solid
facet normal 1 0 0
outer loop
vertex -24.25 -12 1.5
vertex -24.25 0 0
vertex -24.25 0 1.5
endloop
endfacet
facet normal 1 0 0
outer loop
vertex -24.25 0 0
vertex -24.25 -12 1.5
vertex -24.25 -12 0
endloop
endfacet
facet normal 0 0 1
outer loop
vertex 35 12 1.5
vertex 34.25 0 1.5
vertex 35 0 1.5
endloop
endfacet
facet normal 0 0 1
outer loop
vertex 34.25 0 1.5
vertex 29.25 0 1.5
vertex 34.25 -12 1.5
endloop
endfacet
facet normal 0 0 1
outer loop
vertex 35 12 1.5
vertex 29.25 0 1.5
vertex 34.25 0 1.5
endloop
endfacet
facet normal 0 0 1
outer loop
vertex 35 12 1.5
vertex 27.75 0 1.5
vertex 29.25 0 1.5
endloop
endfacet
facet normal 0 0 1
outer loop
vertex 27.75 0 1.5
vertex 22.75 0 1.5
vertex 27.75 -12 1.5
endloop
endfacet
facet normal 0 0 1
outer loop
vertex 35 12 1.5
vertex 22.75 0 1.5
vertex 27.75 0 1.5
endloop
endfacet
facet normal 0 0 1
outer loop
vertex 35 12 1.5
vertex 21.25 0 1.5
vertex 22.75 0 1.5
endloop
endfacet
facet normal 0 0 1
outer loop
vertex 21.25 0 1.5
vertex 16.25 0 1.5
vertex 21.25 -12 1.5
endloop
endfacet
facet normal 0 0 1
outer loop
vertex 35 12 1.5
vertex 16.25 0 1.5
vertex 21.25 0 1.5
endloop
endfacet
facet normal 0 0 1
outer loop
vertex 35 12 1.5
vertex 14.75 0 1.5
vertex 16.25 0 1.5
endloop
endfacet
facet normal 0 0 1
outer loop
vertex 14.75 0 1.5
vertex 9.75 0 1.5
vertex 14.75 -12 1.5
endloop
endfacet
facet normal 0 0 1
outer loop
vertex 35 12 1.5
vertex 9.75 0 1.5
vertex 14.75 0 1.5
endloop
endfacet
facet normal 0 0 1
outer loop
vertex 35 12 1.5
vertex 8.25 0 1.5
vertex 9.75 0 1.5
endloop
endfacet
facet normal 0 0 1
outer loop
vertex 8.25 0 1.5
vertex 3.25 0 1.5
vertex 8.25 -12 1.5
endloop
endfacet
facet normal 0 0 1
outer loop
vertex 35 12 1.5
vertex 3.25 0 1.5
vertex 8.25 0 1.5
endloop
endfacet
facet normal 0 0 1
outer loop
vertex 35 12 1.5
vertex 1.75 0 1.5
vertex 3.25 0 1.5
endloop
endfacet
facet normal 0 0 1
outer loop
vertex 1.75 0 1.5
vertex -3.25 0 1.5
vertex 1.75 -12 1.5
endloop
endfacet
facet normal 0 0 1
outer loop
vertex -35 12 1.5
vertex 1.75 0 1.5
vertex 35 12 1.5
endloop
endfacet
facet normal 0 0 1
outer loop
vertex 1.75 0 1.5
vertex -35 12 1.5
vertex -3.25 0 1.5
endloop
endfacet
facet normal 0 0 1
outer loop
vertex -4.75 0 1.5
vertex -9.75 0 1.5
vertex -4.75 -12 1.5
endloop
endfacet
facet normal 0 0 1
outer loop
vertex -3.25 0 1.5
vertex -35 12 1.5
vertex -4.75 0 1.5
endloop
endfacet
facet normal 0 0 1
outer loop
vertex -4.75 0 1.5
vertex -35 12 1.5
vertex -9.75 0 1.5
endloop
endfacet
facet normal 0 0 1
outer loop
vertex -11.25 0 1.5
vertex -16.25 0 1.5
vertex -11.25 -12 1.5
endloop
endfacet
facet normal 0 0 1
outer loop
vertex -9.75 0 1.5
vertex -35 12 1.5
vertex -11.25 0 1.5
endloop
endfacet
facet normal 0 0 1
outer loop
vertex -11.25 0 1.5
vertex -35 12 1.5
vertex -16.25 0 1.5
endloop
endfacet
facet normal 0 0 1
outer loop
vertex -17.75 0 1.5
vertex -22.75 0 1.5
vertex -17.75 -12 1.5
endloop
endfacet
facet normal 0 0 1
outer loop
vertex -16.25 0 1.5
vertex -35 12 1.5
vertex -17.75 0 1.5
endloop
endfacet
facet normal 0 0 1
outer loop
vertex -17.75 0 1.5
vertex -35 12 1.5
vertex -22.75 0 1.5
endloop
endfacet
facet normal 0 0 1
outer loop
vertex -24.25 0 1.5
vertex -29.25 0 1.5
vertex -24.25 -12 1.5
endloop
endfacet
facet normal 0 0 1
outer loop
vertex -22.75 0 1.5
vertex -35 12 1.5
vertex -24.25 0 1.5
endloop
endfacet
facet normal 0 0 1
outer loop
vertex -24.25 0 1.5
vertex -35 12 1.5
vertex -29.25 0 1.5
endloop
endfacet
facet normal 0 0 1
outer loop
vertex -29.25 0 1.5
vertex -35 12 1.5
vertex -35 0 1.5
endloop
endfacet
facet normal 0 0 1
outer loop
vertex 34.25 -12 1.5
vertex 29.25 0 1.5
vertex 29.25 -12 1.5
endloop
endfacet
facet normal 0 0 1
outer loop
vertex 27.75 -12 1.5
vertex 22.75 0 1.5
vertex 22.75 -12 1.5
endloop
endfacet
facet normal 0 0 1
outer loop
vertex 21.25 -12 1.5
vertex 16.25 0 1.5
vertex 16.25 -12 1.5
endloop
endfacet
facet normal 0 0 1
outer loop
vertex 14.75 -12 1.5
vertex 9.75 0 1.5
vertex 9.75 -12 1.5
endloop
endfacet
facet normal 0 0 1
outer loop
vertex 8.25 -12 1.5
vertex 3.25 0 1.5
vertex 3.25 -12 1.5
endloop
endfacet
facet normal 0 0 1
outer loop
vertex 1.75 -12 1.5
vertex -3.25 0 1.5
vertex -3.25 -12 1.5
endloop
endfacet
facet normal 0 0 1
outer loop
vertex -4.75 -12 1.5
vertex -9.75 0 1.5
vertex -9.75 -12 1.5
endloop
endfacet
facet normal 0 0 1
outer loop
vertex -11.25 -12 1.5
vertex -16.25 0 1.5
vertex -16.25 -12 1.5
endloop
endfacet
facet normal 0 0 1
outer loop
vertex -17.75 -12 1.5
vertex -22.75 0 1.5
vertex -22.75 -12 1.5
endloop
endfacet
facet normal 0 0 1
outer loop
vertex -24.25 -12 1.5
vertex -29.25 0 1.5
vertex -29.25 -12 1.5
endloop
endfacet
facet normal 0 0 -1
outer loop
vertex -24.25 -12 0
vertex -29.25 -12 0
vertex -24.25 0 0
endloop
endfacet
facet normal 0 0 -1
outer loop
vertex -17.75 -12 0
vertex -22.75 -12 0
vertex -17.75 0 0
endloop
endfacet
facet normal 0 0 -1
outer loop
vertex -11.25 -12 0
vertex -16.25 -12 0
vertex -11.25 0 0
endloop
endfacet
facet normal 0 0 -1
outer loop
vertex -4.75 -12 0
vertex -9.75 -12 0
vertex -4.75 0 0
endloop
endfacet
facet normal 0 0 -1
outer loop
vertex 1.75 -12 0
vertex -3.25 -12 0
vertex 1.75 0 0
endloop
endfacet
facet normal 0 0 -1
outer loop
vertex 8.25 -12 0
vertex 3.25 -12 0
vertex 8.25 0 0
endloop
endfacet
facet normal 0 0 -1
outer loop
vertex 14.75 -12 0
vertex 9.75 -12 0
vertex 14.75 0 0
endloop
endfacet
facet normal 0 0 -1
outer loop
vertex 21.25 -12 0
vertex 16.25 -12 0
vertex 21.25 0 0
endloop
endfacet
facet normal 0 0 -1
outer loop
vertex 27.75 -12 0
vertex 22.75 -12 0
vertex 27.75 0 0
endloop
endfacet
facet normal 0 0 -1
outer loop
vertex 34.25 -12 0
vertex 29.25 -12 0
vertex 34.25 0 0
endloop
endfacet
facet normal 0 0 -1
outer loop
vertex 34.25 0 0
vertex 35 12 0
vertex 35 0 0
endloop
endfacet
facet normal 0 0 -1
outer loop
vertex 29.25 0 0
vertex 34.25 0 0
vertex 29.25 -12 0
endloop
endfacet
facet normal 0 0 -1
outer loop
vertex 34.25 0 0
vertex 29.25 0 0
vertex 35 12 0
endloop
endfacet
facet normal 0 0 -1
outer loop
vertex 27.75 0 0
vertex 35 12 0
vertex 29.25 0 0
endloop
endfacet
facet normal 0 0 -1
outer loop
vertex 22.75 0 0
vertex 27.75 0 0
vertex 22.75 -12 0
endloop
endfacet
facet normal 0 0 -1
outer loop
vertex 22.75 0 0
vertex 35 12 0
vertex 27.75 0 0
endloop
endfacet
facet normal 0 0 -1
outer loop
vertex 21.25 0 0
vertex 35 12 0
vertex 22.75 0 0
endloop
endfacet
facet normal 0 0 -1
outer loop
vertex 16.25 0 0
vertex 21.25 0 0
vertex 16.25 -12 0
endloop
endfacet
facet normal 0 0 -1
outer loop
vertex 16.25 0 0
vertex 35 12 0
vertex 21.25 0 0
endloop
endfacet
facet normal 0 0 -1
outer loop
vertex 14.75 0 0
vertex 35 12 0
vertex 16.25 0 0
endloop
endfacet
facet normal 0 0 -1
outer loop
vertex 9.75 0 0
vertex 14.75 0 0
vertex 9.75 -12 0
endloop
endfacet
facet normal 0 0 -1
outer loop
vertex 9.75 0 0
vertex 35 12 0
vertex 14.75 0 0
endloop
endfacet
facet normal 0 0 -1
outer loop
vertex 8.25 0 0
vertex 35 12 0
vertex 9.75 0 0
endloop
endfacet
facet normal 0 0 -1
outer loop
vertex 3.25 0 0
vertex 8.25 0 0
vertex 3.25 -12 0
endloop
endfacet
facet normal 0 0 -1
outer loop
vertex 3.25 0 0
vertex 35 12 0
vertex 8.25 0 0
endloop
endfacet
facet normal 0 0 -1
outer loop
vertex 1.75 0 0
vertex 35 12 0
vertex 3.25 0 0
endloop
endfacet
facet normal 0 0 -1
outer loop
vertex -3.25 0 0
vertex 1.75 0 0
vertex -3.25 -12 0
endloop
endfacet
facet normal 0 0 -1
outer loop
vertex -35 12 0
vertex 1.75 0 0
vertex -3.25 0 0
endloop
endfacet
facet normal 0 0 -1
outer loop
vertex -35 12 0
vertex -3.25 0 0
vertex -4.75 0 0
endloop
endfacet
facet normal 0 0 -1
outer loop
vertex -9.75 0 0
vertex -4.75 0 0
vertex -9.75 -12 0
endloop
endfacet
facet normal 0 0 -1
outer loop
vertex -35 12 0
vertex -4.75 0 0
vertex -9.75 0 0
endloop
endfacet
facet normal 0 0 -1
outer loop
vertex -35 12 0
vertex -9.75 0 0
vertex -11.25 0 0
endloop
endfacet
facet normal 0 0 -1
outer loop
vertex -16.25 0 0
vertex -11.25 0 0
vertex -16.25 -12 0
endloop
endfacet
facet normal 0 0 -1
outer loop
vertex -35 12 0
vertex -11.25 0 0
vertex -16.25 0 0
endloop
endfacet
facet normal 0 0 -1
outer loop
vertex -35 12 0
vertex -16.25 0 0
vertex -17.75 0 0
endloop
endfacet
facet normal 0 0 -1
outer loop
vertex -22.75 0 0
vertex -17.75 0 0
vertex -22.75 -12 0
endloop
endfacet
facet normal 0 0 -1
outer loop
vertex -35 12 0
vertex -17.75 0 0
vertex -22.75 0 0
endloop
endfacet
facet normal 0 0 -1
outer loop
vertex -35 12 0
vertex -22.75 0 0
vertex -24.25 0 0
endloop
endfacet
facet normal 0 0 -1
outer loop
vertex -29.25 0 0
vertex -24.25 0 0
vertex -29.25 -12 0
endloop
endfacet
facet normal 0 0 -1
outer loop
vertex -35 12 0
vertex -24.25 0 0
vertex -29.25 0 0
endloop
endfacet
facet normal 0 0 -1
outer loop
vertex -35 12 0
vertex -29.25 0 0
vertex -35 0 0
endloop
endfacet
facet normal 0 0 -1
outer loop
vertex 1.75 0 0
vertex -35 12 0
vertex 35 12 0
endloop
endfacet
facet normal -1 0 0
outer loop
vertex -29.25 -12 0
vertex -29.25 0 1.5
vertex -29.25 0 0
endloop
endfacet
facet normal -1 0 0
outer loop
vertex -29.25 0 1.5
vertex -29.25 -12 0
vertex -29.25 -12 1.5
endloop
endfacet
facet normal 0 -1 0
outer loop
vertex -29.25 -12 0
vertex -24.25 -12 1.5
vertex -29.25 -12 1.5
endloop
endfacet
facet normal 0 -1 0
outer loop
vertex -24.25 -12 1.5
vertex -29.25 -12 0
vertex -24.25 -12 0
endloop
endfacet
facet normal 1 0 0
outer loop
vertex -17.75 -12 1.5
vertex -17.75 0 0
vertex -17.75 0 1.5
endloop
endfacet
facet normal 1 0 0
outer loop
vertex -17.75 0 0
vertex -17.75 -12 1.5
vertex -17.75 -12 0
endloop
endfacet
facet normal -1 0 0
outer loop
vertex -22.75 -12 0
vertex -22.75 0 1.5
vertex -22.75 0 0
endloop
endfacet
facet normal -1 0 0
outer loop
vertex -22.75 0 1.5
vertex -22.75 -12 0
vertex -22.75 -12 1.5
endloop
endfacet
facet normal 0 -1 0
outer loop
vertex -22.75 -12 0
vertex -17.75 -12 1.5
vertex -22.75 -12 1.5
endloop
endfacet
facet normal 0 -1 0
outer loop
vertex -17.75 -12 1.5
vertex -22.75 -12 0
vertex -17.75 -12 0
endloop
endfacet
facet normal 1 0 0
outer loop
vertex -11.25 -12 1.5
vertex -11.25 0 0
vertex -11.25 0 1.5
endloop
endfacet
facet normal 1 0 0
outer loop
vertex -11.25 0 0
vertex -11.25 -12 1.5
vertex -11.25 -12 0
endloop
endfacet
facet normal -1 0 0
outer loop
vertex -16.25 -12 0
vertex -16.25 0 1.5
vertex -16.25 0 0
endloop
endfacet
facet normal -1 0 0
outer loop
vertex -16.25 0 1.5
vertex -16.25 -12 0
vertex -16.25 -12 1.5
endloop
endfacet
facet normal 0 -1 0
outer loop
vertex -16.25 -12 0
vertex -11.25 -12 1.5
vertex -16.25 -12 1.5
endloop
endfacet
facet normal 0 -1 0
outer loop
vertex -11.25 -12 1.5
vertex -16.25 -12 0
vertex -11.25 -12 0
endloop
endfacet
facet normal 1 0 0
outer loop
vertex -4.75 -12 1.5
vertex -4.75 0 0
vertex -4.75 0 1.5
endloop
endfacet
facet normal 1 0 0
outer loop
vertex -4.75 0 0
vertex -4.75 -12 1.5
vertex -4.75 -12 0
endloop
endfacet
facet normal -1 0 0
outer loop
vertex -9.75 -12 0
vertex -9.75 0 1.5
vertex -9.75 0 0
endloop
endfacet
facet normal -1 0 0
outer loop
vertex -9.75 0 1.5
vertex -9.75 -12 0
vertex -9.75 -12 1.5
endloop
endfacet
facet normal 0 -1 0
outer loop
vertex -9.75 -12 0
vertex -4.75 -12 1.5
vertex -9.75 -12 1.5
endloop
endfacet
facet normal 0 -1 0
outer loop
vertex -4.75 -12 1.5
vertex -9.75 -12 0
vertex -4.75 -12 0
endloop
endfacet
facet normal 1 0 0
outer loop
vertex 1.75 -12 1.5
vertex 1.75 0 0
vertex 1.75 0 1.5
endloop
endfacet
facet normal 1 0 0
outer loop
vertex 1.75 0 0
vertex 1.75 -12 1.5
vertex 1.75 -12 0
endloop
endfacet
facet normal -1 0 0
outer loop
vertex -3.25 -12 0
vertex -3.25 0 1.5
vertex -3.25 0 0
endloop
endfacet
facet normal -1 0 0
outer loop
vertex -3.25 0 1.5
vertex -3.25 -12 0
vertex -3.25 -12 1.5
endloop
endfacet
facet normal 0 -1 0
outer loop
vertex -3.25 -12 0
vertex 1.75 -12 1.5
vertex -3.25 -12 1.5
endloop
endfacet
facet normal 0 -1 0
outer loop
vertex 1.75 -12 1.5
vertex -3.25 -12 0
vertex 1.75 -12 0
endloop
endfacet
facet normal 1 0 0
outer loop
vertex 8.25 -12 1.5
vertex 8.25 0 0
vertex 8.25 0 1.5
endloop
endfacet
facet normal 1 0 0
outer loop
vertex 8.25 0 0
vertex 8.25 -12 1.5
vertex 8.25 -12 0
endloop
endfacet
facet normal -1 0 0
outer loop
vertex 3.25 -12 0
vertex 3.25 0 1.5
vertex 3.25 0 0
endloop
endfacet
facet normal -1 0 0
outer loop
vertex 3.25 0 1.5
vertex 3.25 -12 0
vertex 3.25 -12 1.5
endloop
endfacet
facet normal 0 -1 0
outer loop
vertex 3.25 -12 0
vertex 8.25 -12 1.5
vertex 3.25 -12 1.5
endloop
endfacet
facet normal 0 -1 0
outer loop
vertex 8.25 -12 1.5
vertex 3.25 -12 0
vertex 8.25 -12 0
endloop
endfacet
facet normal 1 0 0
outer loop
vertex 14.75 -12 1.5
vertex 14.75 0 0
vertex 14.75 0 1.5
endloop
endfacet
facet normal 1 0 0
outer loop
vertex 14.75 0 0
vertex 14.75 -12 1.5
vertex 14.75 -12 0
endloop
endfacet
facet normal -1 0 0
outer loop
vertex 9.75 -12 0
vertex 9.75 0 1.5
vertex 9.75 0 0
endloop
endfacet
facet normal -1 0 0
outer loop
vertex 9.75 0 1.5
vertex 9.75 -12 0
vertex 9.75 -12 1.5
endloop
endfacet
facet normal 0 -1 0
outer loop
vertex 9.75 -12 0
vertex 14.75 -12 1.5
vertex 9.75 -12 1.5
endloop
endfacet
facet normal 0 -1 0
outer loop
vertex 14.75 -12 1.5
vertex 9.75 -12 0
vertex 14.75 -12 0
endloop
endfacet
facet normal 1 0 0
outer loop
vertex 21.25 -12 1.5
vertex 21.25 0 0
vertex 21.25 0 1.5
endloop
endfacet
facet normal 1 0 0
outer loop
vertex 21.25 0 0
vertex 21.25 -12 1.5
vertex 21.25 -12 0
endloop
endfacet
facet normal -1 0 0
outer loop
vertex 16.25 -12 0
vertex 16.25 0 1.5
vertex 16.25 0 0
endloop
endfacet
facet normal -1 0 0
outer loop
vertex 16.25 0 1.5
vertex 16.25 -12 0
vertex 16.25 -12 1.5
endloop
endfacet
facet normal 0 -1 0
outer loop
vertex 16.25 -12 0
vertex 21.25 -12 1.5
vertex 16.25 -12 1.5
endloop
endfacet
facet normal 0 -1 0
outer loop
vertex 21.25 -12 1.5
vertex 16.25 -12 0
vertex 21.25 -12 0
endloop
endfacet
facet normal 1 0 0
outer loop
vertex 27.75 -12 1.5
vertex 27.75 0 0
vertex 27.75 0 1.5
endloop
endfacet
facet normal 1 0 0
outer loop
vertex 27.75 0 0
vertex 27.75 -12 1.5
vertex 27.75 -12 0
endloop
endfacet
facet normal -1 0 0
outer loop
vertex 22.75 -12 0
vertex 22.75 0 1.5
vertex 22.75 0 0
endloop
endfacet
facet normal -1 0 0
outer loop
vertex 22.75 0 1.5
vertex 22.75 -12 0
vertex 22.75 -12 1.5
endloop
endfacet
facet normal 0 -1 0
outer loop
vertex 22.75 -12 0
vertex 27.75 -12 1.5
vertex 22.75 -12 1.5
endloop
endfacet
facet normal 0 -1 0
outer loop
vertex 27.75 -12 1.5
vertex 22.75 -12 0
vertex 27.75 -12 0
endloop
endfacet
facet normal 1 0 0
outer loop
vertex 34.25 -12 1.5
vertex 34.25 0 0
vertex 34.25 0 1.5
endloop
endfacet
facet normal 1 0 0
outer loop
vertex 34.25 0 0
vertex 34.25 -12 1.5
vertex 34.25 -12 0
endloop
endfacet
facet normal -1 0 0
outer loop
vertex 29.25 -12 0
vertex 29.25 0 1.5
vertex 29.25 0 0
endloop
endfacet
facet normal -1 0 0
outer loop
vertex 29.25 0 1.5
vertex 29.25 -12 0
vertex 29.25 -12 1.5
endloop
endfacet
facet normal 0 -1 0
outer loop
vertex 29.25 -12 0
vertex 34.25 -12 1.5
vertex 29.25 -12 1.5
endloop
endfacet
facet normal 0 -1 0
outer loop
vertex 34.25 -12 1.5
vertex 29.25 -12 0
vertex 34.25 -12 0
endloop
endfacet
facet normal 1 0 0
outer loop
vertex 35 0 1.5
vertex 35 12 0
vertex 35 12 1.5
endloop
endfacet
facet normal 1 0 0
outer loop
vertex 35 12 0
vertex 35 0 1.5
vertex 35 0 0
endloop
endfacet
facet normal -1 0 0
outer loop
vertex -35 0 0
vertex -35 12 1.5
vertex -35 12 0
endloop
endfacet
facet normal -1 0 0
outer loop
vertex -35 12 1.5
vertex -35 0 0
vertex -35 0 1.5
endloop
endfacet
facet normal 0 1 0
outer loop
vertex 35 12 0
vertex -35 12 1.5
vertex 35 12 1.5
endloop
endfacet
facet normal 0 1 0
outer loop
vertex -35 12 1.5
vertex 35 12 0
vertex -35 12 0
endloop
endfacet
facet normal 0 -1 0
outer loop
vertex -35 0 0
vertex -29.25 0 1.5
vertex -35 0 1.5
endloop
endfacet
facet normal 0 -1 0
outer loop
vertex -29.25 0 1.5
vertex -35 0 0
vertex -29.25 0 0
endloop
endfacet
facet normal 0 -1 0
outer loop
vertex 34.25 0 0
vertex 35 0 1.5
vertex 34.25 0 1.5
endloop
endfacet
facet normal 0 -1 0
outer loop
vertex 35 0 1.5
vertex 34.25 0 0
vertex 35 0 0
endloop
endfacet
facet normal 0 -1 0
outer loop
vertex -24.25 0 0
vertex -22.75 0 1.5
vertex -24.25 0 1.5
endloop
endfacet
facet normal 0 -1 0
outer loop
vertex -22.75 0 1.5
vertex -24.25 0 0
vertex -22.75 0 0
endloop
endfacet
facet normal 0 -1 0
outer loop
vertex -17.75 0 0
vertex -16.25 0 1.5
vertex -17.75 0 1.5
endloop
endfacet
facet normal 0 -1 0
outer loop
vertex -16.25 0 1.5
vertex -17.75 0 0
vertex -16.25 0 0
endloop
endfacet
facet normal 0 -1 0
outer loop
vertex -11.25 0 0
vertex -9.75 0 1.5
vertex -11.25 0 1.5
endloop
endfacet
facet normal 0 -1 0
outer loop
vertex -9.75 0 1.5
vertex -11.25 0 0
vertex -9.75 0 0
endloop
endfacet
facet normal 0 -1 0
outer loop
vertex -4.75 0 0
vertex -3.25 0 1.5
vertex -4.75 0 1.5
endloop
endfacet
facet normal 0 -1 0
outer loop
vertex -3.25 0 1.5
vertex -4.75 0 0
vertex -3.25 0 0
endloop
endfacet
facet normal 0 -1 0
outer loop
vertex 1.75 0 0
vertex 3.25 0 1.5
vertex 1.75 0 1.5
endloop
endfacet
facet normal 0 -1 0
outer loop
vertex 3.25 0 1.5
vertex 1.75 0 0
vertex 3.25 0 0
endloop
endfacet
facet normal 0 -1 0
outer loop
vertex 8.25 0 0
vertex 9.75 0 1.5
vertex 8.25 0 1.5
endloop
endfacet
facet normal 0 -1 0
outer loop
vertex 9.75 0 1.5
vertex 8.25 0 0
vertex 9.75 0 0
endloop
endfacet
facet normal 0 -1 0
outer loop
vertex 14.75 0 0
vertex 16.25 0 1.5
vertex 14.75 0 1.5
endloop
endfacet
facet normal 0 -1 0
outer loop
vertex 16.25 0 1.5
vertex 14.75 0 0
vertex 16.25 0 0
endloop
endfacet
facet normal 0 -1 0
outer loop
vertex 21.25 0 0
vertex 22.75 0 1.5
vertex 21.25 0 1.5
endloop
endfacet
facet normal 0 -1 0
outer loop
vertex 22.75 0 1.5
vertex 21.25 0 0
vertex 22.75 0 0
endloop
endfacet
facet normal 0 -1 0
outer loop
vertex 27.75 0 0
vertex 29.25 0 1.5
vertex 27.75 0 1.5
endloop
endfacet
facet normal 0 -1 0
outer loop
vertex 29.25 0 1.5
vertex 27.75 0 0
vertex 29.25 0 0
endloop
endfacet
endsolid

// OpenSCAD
// 10-well agarose gel comb, printed lying flat
// Units: mm

plate_t      = 1.5;   // plate thickness (Z)
spine_len    = 70;    // spine length (X)
spine_w      = 12;    // spine width (Y)
teeth_n      = 10;    // number of teeth
teeth_w      = 5;     // tooth width (X)
teeth_l      = 12;    // tooth length (Y)
teeth_gap    = 1.5;   // gap between teeth (X)
overcut      = 0.5;   // cutter overshoot past faces

$fn = 64;

pitch = teeth_w + teeth_gap;
x0    = -(teeth_n - 1) * pitch / 2;        // first tooth centre X
// teeth span = 10*5 + 9*1.5 = 58.5, centred on 70 mm spine

union() {
    // spine (back bar)
    translate([-spine_len/2, 0, 0])
        cube([spine_len, spine_w, plate_t]);

    // teeth hanging in -Y
    for (i = [0 : teeth_n - 1])
        translate([x0 + i * pitch, -teeth_l, 0])
            cube([teeth_w, teeth_l + overcut, plate_t]);
}
